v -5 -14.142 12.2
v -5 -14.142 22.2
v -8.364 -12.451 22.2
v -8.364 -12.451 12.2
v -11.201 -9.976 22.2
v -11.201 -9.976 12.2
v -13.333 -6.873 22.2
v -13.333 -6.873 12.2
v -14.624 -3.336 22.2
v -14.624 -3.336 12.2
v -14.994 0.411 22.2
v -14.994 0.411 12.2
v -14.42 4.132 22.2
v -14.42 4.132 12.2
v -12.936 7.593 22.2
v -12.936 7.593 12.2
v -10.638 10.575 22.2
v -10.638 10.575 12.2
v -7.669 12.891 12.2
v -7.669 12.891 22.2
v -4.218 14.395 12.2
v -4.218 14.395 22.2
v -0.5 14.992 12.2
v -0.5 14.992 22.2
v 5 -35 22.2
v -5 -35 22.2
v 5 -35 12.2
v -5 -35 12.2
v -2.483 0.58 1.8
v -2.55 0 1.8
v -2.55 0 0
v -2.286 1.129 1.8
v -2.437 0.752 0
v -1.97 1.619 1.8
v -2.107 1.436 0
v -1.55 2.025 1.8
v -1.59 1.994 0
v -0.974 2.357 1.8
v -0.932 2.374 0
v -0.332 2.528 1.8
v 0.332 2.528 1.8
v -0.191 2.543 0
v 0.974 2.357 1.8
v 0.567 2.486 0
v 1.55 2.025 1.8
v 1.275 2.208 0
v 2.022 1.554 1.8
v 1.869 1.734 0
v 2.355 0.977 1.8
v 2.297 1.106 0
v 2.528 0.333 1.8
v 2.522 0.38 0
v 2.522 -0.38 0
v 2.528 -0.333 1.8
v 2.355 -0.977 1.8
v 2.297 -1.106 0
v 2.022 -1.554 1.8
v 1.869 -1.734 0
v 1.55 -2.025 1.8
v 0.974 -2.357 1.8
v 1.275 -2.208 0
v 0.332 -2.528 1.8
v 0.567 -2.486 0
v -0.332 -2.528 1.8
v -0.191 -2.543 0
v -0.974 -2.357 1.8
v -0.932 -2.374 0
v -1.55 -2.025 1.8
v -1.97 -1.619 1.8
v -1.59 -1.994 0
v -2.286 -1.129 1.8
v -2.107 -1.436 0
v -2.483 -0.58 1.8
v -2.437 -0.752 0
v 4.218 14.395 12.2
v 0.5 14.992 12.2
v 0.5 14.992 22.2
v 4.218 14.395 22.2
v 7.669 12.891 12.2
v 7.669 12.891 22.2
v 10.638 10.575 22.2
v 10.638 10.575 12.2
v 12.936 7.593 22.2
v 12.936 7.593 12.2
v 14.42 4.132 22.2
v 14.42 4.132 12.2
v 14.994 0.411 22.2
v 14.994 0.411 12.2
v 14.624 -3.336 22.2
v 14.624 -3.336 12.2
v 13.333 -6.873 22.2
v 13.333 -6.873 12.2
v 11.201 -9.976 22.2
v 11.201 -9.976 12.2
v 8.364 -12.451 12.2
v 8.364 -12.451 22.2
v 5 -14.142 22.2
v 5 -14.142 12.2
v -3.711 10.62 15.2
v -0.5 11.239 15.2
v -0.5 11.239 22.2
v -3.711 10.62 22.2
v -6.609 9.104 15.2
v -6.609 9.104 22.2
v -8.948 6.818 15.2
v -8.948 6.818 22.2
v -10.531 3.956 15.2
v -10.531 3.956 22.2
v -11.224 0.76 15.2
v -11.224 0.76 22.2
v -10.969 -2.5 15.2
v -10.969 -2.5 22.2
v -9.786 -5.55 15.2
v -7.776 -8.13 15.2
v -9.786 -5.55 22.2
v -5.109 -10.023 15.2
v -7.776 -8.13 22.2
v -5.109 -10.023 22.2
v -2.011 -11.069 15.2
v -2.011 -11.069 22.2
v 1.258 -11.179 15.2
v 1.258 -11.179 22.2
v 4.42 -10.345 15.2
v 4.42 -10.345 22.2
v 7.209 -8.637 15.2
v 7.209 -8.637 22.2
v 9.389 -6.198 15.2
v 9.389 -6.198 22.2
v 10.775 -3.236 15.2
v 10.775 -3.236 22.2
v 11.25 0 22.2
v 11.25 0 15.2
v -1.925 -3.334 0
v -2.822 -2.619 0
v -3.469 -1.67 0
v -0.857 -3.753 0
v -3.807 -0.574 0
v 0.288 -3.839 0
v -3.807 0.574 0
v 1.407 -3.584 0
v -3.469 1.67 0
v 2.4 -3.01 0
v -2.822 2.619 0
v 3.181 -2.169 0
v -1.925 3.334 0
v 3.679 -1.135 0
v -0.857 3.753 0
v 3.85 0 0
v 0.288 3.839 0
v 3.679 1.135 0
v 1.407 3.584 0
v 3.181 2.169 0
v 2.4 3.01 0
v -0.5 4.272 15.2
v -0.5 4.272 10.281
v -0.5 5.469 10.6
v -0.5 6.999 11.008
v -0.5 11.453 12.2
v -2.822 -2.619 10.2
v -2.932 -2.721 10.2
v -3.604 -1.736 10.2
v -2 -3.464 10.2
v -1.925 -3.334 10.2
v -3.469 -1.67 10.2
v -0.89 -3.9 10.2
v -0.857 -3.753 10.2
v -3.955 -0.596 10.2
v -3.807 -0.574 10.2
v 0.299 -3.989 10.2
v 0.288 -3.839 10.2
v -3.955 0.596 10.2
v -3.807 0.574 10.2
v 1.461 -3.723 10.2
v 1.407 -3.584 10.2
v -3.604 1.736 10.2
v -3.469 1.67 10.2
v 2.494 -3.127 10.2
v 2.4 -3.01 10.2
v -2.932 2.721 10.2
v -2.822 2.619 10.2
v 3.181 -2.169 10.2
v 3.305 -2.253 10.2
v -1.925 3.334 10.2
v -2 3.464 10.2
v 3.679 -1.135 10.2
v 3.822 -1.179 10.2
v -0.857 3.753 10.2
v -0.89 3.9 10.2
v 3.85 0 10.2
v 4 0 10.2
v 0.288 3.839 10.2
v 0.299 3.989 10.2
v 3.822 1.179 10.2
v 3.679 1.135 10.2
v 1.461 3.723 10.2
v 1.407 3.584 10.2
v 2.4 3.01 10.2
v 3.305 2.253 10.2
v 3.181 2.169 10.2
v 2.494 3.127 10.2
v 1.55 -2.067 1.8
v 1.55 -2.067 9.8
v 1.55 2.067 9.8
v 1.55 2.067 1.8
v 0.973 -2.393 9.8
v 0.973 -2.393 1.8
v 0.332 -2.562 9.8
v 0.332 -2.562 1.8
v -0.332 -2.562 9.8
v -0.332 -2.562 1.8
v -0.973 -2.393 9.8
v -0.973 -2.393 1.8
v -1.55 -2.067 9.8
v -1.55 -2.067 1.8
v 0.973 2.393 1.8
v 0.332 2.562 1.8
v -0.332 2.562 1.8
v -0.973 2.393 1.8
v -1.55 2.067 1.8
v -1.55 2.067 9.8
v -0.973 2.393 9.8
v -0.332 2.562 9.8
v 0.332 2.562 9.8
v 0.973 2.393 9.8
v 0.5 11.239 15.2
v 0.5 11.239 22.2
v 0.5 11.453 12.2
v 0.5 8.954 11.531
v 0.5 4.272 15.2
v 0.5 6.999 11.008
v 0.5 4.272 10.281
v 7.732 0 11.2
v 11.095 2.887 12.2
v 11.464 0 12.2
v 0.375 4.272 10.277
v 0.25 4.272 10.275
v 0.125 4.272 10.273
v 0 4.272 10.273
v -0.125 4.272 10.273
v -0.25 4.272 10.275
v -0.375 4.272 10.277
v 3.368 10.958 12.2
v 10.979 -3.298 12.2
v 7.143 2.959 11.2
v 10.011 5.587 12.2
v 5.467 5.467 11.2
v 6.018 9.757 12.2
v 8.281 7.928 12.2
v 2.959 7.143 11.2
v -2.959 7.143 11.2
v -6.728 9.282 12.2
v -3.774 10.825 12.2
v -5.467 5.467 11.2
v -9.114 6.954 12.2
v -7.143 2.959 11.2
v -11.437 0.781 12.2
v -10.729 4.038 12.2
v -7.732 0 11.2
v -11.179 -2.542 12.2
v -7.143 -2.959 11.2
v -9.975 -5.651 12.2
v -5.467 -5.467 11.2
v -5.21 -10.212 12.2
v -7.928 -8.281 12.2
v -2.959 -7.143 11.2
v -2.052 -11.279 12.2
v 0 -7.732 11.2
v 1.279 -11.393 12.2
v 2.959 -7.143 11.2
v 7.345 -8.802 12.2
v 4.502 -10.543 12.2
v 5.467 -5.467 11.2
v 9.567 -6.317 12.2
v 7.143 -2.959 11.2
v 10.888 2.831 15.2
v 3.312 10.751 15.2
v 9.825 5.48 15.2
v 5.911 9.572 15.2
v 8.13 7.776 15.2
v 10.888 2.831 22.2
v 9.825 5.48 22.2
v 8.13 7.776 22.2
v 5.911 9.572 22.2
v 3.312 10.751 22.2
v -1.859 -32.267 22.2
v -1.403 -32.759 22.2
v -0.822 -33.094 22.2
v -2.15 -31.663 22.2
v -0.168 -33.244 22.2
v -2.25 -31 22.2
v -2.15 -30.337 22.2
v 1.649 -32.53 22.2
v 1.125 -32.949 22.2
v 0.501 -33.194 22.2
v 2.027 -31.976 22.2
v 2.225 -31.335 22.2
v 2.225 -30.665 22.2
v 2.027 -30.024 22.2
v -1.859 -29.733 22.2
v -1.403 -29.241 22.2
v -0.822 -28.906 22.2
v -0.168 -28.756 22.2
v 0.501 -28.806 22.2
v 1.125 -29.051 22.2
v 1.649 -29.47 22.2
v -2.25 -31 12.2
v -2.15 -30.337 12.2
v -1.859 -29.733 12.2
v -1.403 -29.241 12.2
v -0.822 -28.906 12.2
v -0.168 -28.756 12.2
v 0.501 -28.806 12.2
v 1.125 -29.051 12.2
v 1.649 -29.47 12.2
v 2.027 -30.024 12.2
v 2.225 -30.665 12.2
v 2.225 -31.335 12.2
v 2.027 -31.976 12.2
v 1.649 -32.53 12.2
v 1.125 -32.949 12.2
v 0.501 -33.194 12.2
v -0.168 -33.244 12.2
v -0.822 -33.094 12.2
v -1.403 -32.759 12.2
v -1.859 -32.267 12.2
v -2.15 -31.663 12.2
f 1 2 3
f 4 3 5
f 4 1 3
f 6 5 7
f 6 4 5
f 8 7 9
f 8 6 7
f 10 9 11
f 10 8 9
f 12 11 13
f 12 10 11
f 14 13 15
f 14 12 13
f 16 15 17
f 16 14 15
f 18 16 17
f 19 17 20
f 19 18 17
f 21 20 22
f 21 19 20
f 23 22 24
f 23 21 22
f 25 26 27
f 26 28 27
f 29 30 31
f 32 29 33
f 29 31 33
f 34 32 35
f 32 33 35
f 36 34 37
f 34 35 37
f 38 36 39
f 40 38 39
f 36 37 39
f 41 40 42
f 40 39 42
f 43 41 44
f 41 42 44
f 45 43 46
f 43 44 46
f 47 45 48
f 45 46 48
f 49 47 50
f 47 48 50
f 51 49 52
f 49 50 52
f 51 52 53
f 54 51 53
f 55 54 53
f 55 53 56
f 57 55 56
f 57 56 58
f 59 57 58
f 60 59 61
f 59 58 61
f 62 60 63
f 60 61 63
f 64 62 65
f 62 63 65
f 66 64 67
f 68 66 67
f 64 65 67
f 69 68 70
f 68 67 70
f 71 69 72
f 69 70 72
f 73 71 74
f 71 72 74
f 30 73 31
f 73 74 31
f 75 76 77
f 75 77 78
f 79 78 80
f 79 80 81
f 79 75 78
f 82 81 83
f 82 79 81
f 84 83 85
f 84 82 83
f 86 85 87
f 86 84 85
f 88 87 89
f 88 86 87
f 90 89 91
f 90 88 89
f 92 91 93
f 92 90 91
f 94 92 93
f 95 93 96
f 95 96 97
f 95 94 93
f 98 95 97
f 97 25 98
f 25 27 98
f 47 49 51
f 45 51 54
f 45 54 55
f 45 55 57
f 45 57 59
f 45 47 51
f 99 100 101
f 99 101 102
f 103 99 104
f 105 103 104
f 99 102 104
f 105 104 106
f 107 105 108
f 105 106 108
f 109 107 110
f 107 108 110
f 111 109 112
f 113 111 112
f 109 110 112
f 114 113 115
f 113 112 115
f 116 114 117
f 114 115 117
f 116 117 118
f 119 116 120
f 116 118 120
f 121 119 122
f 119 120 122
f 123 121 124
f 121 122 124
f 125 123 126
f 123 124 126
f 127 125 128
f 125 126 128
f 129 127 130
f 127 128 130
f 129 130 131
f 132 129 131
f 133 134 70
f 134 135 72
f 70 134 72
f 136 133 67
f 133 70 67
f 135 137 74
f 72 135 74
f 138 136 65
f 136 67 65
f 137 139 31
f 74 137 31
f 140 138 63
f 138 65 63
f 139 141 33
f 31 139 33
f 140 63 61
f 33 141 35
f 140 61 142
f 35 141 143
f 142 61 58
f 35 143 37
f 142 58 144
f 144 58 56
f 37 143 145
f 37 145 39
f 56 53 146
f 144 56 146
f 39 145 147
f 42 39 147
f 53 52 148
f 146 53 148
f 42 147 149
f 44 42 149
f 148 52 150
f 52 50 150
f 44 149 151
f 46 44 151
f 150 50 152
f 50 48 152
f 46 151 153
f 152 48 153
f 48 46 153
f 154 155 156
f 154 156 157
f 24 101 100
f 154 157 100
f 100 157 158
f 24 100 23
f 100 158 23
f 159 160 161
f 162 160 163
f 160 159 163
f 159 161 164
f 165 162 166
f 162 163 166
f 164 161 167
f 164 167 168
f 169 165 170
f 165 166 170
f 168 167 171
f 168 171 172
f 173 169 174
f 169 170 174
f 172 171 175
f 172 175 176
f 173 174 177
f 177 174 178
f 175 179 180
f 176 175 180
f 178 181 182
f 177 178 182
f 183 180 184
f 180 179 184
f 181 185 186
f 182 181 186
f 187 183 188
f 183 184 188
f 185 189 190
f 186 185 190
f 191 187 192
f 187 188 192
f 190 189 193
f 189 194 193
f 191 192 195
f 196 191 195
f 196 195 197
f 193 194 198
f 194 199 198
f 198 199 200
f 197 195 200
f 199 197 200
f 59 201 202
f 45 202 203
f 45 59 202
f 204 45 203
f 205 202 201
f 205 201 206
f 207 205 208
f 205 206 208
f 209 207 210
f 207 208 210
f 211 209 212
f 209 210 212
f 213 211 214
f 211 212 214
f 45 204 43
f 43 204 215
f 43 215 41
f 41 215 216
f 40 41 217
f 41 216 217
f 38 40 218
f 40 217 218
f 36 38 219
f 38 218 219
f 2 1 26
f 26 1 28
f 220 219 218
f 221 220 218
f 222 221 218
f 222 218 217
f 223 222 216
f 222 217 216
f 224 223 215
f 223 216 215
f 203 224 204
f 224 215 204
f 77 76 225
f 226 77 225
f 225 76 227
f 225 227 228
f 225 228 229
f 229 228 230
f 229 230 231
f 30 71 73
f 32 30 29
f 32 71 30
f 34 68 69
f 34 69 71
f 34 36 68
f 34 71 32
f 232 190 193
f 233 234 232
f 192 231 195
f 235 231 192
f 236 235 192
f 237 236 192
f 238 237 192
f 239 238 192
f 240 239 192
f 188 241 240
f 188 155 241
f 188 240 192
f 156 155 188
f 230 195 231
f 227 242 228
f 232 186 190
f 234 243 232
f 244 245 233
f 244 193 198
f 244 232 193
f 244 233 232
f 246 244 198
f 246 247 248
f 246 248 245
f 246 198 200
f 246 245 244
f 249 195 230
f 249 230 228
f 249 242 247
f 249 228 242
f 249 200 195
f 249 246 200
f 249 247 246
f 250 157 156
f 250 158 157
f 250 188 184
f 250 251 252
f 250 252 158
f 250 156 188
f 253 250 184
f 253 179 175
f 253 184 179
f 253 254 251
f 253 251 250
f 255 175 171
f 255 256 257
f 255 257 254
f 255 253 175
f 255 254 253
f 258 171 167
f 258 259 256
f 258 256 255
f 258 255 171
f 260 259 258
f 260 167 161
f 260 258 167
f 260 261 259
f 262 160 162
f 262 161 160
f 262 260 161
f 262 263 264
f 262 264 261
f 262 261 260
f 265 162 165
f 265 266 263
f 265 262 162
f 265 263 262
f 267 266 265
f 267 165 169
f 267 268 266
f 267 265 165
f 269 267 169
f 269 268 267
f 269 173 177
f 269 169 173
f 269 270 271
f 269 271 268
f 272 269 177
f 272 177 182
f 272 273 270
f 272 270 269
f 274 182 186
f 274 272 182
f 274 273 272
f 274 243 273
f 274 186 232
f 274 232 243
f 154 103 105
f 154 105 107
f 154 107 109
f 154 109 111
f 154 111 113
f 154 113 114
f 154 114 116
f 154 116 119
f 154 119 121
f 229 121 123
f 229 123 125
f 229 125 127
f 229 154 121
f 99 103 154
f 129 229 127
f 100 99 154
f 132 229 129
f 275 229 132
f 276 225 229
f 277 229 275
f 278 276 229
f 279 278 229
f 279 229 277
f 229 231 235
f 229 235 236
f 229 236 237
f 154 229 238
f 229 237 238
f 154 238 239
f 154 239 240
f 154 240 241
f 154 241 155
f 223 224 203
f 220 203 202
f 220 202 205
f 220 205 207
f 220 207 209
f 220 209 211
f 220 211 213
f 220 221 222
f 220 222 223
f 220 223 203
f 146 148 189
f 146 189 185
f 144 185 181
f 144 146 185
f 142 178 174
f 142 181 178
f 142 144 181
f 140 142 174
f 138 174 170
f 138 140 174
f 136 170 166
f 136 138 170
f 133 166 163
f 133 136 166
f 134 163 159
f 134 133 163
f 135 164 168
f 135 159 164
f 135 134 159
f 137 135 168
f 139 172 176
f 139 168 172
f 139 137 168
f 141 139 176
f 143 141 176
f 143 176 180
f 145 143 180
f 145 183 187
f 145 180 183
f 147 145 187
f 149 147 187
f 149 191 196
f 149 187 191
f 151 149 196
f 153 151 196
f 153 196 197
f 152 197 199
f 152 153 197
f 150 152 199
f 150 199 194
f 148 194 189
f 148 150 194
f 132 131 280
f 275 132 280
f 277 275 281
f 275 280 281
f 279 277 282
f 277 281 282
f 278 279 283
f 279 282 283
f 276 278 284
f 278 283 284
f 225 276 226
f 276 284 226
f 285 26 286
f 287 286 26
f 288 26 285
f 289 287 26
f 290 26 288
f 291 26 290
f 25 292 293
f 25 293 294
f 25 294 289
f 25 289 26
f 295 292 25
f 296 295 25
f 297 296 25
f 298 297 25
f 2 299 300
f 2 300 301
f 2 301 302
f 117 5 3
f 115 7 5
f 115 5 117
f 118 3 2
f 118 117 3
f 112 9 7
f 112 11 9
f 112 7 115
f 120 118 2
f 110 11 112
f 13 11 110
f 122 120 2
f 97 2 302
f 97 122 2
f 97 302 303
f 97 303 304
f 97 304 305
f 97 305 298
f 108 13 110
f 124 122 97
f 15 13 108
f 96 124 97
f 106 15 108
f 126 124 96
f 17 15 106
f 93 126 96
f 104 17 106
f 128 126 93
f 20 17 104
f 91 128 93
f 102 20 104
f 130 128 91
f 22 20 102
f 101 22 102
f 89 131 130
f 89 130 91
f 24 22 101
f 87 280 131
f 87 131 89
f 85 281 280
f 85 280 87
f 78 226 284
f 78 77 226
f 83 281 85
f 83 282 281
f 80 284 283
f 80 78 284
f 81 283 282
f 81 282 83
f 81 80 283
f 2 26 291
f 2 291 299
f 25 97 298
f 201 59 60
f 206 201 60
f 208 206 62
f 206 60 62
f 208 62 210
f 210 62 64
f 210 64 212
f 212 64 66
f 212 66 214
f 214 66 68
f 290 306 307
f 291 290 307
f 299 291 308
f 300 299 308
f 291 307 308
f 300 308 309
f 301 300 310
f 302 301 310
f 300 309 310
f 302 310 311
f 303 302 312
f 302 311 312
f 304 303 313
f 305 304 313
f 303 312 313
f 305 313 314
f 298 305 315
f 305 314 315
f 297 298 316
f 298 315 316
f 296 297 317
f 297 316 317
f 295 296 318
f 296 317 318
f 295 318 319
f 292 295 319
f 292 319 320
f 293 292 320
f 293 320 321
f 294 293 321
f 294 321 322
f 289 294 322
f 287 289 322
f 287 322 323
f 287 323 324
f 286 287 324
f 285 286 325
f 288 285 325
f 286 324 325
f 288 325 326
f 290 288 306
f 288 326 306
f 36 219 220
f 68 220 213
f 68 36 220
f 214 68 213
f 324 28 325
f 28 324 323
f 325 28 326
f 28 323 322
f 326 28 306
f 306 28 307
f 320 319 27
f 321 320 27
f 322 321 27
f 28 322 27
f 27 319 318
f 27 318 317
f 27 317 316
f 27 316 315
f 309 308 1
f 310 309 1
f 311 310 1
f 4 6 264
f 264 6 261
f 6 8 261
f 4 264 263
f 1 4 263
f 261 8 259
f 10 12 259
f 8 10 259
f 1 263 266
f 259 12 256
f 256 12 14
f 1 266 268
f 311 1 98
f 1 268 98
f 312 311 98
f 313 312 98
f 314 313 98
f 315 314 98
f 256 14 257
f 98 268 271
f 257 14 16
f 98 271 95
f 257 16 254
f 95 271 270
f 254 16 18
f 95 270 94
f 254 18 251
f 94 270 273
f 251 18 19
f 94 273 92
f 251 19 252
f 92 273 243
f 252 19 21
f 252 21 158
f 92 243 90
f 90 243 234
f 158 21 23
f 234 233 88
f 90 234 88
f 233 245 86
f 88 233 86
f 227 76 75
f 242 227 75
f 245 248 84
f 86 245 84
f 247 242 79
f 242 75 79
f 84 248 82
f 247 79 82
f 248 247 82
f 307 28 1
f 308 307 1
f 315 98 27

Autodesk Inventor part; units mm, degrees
ref_plane "YZ Plane" through (0, 0, 0) normal (1, 0, 0) x (0, 1, 0)
ref_plane "XZ Plane" through (0, 0, 0) normal (0, 1, 0) x (-1, 0, 0)
ref_plane "XY Plane" through (0, 0, 0) normal (0, 0, 1) x (1, 0, 0)
sketch "Sketch1" plane through (0, 0, 0) normal (0, 0, 1) x (1, 0, 0)
  circle A0 centre (0, 0) radius 3.85
  dimension "d0" = 7.7
extrude "Extrusion1" add sketch "Sketch1" along normal blind 10.2
sketch "Sketch2" plane through (0, 0, 10.2) normal (0, 0, 1) x (1, 0, 0)
  circle A0 centre (0, 0) radius 4
  dimension "d3" = 8
extrude "Extrusion2" add sketch "Sketch2" along normal blind 2 draft 75
sketch "Sketch3" plane through (0, 0, 12.2) normal (0, 0, 1) x (1, 0, 0)
  circle A0 centre (0, 0) radius 15
  dimension "d6" = 30
extrude "Extrusion3" add sketch "Sketch3" along normal blind 10
sketch "Sketch5" plane through (0, 0, 22.2) normal (0, 0, 1) x (1, 0, 0)
  circle A0 centre (0, 0) radius 11.25
  dimension "d11" = 22.5
extrude "Extrusion5" cut sketch "Sketch5" against normal blind 7
sketch "Sketch6" plane through (0, 0, 0) normal (0, 0, -1) x (-1, 0, 0)
  circle A0 centre (0, 0) radius 2.55
  dimension "d14" = 5.1
extrude "Extrusion6" cut sketch "Sketch6" against normal blind 1.8
sketch "Sketch7" plane through (0, 0, 1.8) normal (0, 0, -1) x (-1, 0, 0)
  point P0 (0, 0)
sketch "Sketch8" plane through (0, 0, 1.8) normal (0, 0, -1) x (-1, 0, 0)
  line L0 (-1.55, 2.0667) -> (1.55, 2.0667)
  line L1 (1.55, 2.0667) -> (1.55, -2.0667)
  line L2 (1.55, -2.0667) -> (-1.55, -2.0667)
  line L3 (-1.55, -2.0667) -> (-1.55, 2.0667)
  line L4 (-1.55, 2.0667) -> (1.55, -2.0667) construction
  line L5 (1.55, 2.0667) -> (-1.55, -2.0667) construction
  circle A0 centre (0, 0) radius 2.5833
  arc A1 (1.55, 2.0667) -> (-1.55, 2.0667) centre (0, 0) ccw
  arc A2 (-1.55, -2.0667) -> (1.55, -2.0667) centre (0, 0) ccw
  arc A3 (1.55, 2.0667) -> (-1.55, 2.0667) centre (0, 0.6019) ccw
  arc A4 (-1.55, -2.0667) -> (1.55, -2.0667) centre (0, -0.6159) ccw
  dimension "d17" = 3.1
extrude "Extrusion7" cut sketch "Sketch8" against normal blind 8 contours A0 L0 | L0 L1 L2 L3 | L2 A0
sketch "Sketch9" plane through (0, 0, 12.2) normal (0, 0, -1) x (-1, 0, 0)
  line L0 (-5, -12) -> (5, -12)
  line L1 (5, -12) -> (5, -35)
  line L2 (5, -35) -> (-5, -35)
  line L3 (-5, -35) -> (-5, -12)
  circle A0 centre (0, 0) radius 15 projected
  point P0 (0, -15)
  dimension "d25" = 20
  dimension "d30" = 5
  dimension "d31" = 5
  dimension "d32" = 3
extrude "Extrusion8" add sketch "Sketch9" against normal blind 10 contours L0 L1 A0 L3 | A0 L1 L2 L3 picked at (0.5652, -12.968)
sketch "Sketch10" plane through (0, 0, 12.2) normal (0, 0, -1) x (-1, 0, 0)
  circle A0 centre (0, -31) radius 2.25
  line L0 (-5, -35) -> (5, -35) projected
  point P0 (0, 0)
  dimension "d33" = 4.5
  dimension "d34" = 4
extrude "Extrusion9" cut sketch "Sketch10" against normal through all
sketch "Sketch11" plane through (0, 0, 22.2) normal (0, 0, 1) x (1, 0, 0)
  point P0 (0, 0)
sketch "Sketch12" plane through (0, 0, 0) normal (0, 0, -1) x (-1, 0, 0)
  line L0 (0, 4.2717) -> (0.5, 4.2717)
  line L1 (0.5, 4.2717) -> (0.5, 22.715)
  line L2 (0.5, 22.715) -> (-0.5, 22.715)
  line L3 (-0.5, 22.715) -> (-0.5, 4.2717)
  line L4 (-0.5, 4.2717) -> (0, 4.2717)
  point P0 (0, 0)
  dimension "d37" = 0.5
  dimension "d38" = 1
extrude "Extrusion10" cut sketch "Sketch12" against normal through all
properties part number "Motorshaft"
